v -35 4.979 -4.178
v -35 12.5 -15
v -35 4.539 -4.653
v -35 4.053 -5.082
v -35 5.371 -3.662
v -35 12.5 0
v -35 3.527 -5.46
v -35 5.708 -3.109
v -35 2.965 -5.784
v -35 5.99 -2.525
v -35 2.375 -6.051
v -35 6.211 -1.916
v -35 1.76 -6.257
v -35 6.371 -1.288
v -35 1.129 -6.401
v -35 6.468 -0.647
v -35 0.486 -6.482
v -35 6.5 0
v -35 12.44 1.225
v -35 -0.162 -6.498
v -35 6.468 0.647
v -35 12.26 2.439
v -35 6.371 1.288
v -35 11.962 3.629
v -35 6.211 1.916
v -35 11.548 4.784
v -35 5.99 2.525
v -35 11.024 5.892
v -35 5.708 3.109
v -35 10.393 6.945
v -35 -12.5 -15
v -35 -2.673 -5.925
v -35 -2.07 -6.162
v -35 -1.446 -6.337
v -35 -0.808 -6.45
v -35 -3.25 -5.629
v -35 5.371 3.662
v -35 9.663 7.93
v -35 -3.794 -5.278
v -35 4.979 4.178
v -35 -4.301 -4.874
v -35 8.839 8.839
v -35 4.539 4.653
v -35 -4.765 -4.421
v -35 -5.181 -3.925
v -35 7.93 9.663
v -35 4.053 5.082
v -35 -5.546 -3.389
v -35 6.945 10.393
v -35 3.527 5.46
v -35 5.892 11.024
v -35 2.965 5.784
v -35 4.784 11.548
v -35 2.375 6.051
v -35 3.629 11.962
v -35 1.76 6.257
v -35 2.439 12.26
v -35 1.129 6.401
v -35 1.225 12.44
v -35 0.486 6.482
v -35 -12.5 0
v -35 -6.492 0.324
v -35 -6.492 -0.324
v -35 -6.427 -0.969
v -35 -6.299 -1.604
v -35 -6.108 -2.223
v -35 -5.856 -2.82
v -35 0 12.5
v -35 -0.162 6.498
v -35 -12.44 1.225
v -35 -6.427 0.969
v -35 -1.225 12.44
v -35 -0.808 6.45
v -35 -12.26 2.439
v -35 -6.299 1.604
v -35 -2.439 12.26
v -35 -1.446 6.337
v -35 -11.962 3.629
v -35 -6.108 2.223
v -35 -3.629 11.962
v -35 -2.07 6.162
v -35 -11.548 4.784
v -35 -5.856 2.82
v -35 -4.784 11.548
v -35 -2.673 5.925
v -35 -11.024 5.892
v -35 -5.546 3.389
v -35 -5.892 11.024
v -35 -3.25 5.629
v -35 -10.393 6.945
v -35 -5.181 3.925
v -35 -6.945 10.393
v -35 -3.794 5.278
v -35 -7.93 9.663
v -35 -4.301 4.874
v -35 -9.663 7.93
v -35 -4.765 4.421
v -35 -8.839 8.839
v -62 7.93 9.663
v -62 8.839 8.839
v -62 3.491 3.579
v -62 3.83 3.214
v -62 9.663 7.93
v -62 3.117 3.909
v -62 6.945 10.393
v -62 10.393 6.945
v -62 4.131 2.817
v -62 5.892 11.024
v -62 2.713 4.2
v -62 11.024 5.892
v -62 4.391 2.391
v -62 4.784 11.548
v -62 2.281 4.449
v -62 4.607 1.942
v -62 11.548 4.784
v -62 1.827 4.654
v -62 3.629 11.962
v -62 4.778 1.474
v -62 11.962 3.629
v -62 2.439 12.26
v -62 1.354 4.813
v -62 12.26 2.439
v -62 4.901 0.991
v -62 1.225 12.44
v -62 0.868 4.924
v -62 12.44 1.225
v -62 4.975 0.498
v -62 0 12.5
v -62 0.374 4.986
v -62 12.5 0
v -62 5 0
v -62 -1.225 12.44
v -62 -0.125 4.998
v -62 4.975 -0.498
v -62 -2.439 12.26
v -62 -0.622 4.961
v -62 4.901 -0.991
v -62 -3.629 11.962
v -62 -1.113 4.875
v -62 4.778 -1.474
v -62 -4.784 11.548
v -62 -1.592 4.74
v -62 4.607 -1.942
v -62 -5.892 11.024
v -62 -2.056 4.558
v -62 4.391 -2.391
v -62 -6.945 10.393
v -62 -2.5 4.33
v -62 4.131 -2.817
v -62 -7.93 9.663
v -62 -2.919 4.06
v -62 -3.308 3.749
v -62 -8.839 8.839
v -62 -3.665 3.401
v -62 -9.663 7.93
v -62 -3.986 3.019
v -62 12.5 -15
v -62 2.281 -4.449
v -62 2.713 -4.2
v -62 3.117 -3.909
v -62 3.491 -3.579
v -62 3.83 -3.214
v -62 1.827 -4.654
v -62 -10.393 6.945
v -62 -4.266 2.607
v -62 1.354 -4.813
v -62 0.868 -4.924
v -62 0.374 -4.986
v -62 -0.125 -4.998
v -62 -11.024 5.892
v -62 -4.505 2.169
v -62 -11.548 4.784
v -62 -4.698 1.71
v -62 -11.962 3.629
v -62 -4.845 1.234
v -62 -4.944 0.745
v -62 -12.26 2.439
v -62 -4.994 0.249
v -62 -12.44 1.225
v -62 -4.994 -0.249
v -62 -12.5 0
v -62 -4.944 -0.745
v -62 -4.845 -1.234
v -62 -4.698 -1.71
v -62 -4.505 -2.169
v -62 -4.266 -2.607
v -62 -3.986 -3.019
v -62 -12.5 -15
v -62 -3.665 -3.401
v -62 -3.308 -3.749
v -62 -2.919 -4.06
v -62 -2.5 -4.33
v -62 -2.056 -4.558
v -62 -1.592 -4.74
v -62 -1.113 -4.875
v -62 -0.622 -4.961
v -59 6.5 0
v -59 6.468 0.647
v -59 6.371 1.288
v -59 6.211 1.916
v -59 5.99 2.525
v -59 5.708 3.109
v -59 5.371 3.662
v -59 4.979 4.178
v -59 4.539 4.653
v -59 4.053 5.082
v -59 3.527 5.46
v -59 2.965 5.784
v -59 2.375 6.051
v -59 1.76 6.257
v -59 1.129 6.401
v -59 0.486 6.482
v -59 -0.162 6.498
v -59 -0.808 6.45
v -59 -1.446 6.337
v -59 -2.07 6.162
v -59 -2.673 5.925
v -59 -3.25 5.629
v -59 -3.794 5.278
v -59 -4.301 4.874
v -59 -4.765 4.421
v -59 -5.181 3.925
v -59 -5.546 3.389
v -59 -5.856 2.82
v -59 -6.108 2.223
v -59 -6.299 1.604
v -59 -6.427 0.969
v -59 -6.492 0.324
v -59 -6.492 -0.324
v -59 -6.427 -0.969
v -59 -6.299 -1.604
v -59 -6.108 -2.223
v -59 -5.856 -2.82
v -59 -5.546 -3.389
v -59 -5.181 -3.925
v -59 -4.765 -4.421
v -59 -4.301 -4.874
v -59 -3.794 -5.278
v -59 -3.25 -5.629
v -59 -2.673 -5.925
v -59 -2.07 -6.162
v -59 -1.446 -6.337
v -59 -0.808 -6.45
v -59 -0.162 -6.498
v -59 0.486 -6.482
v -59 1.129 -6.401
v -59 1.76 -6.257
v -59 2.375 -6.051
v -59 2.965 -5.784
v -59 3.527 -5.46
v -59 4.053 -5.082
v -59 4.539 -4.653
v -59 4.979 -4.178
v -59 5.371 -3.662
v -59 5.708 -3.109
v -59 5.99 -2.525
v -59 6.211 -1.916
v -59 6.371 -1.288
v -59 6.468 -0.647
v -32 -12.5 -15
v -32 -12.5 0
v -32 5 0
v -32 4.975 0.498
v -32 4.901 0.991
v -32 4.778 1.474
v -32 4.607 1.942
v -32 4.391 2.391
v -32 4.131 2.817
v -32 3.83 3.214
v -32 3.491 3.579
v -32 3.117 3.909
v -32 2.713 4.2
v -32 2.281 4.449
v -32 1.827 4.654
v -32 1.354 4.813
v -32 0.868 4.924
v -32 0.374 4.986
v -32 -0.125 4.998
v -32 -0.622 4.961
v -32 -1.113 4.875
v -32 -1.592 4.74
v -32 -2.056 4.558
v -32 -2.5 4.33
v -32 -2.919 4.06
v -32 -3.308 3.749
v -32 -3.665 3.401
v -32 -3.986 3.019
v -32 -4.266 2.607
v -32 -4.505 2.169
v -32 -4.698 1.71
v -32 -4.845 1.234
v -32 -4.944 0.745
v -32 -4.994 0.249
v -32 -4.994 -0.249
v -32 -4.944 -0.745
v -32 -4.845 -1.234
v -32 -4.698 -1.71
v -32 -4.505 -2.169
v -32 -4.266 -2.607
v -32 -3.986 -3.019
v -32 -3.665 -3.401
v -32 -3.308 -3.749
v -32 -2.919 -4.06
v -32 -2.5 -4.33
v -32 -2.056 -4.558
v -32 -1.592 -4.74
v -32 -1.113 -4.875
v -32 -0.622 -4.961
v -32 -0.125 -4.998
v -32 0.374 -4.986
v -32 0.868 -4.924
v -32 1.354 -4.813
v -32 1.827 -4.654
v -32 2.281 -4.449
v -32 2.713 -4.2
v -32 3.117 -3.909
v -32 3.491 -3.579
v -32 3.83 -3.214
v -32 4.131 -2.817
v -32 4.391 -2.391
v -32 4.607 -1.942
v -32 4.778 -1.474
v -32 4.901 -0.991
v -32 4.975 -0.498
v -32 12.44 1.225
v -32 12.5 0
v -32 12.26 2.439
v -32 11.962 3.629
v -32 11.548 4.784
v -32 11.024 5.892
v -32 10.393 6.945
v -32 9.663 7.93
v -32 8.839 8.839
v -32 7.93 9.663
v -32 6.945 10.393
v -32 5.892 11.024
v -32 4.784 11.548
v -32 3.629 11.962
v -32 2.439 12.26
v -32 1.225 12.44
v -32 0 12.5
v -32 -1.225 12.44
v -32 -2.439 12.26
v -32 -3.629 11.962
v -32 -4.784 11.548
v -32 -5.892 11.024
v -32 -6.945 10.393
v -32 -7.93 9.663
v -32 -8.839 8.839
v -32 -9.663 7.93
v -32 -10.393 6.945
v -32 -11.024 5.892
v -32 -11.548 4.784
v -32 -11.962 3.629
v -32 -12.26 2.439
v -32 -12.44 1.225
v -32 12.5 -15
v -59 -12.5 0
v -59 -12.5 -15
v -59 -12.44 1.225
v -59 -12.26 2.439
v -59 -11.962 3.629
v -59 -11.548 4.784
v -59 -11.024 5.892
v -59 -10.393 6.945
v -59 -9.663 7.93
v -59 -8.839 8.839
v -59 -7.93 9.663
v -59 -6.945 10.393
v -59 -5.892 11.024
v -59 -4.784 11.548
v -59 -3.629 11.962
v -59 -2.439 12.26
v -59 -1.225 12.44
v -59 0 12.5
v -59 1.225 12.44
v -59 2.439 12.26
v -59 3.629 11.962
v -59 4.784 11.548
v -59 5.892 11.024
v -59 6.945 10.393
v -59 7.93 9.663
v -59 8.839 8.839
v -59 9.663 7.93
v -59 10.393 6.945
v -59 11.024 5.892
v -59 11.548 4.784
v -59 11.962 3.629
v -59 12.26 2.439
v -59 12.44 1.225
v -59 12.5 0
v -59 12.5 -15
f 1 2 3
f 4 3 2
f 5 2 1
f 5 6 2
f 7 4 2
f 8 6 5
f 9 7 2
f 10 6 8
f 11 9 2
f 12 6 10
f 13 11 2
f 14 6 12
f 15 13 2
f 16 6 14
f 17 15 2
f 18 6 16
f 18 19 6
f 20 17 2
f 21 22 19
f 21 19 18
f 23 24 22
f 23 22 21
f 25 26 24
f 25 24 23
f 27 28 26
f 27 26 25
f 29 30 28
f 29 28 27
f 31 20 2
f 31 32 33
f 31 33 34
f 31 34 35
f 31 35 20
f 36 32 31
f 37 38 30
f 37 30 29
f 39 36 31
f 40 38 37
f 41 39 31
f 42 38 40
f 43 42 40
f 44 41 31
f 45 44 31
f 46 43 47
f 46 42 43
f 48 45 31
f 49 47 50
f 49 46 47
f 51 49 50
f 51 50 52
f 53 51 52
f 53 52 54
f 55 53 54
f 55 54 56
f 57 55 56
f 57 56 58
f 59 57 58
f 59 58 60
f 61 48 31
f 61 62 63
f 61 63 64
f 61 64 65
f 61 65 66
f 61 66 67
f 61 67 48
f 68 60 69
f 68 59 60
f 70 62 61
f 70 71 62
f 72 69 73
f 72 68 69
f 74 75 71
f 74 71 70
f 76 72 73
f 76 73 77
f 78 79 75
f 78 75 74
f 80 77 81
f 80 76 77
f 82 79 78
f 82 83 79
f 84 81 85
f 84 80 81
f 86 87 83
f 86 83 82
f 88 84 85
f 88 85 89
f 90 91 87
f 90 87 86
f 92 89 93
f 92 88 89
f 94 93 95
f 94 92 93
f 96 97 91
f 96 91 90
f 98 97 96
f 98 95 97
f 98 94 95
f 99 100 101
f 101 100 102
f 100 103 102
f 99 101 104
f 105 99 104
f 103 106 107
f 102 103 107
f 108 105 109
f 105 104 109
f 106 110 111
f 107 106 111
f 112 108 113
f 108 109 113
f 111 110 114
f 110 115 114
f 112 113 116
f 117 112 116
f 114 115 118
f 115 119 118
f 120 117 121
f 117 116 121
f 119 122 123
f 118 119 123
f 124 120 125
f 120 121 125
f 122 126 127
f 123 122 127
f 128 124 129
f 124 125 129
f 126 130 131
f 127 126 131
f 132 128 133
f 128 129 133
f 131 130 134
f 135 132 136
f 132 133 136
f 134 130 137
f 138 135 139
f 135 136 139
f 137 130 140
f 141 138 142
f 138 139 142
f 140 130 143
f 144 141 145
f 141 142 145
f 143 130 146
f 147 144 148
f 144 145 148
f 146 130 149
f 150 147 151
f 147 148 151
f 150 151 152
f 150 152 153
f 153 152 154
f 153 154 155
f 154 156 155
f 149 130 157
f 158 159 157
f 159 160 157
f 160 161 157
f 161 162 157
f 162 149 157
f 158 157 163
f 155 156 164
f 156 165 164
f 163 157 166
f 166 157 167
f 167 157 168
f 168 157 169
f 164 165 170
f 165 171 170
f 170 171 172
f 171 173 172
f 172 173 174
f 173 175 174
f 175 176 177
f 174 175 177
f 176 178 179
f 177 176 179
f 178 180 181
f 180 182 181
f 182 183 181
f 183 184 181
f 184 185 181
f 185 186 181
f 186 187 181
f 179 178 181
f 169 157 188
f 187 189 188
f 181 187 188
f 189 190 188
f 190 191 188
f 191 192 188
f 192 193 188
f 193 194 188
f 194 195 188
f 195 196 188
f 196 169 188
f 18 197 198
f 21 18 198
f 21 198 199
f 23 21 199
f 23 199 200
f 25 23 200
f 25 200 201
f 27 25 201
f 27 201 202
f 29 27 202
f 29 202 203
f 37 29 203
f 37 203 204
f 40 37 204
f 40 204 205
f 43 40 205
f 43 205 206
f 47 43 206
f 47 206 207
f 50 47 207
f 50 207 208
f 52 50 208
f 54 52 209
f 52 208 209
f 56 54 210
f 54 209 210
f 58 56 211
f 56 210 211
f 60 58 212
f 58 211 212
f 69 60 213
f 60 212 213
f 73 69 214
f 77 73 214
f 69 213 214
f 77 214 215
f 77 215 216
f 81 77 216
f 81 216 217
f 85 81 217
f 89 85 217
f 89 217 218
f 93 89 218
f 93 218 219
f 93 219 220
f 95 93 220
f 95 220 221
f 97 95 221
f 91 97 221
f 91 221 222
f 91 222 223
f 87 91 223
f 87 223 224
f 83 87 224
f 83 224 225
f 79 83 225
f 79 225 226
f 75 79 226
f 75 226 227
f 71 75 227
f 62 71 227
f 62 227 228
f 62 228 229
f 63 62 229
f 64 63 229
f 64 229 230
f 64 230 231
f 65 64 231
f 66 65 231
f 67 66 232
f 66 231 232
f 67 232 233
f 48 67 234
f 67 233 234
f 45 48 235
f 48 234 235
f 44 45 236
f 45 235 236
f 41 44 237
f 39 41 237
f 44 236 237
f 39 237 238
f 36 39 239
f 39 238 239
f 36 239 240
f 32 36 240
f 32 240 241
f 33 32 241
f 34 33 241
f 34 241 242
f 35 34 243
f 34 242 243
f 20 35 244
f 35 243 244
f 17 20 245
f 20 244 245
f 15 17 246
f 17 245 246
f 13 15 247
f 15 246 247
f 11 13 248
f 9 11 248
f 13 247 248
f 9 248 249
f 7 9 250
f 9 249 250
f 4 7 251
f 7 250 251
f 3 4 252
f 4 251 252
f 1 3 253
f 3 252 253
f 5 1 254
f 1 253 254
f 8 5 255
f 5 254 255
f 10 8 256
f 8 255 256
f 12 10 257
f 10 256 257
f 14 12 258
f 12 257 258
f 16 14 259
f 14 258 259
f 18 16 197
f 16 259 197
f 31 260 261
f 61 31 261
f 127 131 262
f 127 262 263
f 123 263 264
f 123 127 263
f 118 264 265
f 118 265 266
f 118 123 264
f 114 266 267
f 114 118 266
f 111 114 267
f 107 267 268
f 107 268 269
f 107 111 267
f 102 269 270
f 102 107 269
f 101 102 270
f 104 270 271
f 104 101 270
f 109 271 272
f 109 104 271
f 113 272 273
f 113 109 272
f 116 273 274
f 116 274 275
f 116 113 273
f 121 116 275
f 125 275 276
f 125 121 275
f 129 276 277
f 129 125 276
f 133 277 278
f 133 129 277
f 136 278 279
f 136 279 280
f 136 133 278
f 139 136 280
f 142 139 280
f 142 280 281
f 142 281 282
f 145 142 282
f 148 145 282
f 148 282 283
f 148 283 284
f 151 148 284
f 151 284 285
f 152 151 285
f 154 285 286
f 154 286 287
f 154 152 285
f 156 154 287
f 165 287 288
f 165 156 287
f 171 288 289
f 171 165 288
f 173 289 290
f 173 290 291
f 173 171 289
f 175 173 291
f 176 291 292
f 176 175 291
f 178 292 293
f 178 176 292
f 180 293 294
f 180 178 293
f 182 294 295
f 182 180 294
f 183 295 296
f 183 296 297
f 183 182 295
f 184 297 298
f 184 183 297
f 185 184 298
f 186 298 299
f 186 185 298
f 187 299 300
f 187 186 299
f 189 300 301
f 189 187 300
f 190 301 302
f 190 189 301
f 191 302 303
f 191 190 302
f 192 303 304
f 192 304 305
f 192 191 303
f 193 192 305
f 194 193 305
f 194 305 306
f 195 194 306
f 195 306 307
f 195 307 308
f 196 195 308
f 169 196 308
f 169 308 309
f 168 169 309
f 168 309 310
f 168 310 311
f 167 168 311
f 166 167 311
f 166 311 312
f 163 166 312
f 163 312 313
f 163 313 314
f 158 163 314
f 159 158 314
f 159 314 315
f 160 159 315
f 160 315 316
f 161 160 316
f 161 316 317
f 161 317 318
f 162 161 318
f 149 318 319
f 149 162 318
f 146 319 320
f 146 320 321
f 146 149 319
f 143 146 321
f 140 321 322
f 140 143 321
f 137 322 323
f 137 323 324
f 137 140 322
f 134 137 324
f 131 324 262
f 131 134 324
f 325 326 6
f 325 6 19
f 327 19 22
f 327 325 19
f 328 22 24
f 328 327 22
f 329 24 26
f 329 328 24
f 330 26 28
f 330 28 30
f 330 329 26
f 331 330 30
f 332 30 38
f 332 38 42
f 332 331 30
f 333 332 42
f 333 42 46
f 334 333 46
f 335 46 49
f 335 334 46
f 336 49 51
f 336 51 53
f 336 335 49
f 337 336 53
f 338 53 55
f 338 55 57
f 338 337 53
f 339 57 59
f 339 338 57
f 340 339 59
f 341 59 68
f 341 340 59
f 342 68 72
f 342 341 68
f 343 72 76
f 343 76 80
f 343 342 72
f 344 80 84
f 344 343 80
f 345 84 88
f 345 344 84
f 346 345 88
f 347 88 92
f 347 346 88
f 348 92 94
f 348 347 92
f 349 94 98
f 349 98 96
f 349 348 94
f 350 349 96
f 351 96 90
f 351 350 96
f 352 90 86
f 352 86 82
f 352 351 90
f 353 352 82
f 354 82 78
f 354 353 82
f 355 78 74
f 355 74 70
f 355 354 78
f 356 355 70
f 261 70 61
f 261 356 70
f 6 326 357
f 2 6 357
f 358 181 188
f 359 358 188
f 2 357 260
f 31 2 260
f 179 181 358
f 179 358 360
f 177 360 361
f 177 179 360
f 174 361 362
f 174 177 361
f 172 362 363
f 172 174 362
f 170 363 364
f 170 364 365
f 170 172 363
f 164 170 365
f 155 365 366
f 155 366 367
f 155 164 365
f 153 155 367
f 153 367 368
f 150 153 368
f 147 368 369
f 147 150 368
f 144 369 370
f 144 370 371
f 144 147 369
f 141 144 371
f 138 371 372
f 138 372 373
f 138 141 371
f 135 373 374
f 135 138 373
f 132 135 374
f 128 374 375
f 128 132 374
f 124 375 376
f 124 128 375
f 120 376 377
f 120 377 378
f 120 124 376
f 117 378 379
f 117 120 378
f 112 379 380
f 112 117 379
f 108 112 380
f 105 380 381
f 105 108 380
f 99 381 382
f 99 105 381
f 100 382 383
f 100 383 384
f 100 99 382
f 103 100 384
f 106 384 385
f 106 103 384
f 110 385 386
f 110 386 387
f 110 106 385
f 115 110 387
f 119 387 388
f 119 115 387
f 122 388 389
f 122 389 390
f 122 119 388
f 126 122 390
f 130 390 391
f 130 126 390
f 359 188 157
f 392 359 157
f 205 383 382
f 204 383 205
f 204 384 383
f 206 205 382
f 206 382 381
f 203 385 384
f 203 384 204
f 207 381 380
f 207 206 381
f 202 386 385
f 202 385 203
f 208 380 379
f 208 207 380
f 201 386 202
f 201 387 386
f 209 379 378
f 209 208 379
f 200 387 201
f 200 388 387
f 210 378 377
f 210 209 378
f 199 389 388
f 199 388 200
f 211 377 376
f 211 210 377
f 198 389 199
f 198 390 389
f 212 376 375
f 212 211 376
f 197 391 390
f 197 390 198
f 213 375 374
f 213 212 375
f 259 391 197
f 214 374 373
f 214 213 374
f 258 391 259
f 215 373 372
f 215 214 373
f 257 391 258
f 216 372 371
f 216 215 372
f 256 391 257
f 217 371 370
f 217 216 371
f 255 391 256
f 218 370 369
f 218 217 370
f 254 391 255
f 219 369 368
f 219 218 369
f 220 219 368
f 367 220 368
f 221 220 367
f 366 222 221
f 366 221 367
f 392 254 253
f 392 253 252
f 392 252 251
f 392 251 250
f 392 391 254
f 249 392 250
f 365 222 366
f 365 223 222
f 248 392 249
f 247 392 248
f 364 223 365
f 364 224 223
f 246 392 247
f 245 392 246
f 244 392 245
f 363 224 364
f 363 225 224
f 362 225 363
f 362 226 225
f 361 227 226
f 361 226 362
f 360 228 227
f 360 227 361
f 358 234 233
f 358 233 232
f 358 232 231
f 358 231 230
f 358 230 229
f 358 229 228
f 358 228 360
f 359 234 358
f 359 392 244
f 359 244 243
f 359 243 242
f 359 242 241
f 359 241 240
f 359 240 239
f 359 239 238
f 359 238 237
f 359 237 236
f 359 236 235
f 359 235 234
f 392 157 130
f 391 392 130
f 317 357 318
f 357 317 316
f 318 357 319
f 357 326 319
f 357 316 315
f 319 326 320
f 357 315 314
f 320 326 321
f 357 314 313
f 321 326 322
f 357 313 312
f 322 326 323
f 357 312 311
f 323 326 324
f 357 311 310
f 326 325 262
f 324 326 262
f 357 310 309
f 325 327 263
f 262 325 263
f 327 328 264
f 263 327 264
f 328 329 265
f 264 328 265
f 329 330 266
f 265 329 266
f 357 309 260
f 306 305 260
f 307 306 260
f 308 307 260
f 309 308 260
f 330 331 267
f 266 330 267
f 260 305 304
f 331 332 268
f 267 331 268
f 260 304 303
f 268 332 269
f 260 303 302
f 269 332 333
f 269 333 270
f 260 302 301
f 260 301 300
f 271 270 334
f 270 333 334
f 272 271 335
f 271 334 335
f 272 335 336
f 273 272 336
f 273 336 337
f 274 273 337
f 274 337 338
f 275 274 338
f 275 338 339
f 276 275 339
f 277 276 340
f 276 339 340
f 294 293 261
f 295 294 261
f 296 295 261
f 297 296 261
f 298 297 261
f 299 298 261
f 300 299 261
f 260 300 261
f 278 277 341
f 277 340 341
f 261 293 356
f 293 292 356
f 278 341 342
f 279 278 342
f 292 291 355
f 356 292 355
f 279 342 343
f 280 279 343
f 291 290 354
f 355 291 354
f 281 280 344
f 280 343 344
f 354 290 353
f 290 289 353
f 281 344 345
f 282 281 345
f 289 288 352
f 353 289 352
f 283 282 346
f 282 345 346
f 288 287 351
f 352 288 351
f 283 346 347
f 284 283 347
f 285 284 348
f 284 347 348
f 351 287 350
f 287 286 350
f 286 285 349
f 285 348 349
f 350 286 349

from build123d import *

# Parameters (mm, degrees)
SKETCH106_R   = 6.5
SKETCH106_R_2 = 5
PAD071_DEPTH  = 30
SKETCH107_R   = 6.5
PAD074_DEPTH  = 3
SKETCH108_R   = 6.5
PAD075_DEPTH  = 3


with BuildPart() as part:
    # Sketch106 → Pad071 (new body)
    with BuildSketch(Plane.YZ):
        Circle(SKETCH106_R)
        Circle(SKETCH106_R_2, mode=Mode.SUBTRACT)
    extrude(amount=PAD071_DEPTH)

    # Sketch107 (on Face3 of Pad071) → Pad074 (join)
    with BuildSketch(Plane(origin=(0, 0, 0), x_dir=(0, 1, 0), z_dir=(-1, 0, 0))):
        with BuildLine():
            Line((-12.5, 15), (12.5, 15))
            Line((12.5, 15), (12.5, 0))
            ThreePointArc((-12.5, 0), (0, -12.5), (12.5, 0))
            Line((-12.5, 0), (-12.5, 15))
        make_face()
        Circle(SKETCH107_R, mode=Mode.SUBTRACT)
    extrude(amount=-PAD074_DEPTH)

    # Sketch108 (on Face3 of Pad074) → Pad075 (join)
    with BuildSketch(Plane.YZ.offset(30)):
        with BuildLine():
            Line((-12.5, -15), (-12.5, 0))
            ThreePointArc((12.5, 0), (0, 12.5), (-12.5, 0))
            Line((12.5, 0), (12.5, -15))
            Line((12.5, -15), (-12.5, -15))
        make_face()
        Circle(SKETCH108_R, mode=Mode.SUBTRACT)
    extrude(amount=-PAD075_DEPTH)


with BuildPart() as part_1:
    # Body045 placement: moved
    add(part.part.moved(Location((-62, 0, 0))))


solid = part_1.part
